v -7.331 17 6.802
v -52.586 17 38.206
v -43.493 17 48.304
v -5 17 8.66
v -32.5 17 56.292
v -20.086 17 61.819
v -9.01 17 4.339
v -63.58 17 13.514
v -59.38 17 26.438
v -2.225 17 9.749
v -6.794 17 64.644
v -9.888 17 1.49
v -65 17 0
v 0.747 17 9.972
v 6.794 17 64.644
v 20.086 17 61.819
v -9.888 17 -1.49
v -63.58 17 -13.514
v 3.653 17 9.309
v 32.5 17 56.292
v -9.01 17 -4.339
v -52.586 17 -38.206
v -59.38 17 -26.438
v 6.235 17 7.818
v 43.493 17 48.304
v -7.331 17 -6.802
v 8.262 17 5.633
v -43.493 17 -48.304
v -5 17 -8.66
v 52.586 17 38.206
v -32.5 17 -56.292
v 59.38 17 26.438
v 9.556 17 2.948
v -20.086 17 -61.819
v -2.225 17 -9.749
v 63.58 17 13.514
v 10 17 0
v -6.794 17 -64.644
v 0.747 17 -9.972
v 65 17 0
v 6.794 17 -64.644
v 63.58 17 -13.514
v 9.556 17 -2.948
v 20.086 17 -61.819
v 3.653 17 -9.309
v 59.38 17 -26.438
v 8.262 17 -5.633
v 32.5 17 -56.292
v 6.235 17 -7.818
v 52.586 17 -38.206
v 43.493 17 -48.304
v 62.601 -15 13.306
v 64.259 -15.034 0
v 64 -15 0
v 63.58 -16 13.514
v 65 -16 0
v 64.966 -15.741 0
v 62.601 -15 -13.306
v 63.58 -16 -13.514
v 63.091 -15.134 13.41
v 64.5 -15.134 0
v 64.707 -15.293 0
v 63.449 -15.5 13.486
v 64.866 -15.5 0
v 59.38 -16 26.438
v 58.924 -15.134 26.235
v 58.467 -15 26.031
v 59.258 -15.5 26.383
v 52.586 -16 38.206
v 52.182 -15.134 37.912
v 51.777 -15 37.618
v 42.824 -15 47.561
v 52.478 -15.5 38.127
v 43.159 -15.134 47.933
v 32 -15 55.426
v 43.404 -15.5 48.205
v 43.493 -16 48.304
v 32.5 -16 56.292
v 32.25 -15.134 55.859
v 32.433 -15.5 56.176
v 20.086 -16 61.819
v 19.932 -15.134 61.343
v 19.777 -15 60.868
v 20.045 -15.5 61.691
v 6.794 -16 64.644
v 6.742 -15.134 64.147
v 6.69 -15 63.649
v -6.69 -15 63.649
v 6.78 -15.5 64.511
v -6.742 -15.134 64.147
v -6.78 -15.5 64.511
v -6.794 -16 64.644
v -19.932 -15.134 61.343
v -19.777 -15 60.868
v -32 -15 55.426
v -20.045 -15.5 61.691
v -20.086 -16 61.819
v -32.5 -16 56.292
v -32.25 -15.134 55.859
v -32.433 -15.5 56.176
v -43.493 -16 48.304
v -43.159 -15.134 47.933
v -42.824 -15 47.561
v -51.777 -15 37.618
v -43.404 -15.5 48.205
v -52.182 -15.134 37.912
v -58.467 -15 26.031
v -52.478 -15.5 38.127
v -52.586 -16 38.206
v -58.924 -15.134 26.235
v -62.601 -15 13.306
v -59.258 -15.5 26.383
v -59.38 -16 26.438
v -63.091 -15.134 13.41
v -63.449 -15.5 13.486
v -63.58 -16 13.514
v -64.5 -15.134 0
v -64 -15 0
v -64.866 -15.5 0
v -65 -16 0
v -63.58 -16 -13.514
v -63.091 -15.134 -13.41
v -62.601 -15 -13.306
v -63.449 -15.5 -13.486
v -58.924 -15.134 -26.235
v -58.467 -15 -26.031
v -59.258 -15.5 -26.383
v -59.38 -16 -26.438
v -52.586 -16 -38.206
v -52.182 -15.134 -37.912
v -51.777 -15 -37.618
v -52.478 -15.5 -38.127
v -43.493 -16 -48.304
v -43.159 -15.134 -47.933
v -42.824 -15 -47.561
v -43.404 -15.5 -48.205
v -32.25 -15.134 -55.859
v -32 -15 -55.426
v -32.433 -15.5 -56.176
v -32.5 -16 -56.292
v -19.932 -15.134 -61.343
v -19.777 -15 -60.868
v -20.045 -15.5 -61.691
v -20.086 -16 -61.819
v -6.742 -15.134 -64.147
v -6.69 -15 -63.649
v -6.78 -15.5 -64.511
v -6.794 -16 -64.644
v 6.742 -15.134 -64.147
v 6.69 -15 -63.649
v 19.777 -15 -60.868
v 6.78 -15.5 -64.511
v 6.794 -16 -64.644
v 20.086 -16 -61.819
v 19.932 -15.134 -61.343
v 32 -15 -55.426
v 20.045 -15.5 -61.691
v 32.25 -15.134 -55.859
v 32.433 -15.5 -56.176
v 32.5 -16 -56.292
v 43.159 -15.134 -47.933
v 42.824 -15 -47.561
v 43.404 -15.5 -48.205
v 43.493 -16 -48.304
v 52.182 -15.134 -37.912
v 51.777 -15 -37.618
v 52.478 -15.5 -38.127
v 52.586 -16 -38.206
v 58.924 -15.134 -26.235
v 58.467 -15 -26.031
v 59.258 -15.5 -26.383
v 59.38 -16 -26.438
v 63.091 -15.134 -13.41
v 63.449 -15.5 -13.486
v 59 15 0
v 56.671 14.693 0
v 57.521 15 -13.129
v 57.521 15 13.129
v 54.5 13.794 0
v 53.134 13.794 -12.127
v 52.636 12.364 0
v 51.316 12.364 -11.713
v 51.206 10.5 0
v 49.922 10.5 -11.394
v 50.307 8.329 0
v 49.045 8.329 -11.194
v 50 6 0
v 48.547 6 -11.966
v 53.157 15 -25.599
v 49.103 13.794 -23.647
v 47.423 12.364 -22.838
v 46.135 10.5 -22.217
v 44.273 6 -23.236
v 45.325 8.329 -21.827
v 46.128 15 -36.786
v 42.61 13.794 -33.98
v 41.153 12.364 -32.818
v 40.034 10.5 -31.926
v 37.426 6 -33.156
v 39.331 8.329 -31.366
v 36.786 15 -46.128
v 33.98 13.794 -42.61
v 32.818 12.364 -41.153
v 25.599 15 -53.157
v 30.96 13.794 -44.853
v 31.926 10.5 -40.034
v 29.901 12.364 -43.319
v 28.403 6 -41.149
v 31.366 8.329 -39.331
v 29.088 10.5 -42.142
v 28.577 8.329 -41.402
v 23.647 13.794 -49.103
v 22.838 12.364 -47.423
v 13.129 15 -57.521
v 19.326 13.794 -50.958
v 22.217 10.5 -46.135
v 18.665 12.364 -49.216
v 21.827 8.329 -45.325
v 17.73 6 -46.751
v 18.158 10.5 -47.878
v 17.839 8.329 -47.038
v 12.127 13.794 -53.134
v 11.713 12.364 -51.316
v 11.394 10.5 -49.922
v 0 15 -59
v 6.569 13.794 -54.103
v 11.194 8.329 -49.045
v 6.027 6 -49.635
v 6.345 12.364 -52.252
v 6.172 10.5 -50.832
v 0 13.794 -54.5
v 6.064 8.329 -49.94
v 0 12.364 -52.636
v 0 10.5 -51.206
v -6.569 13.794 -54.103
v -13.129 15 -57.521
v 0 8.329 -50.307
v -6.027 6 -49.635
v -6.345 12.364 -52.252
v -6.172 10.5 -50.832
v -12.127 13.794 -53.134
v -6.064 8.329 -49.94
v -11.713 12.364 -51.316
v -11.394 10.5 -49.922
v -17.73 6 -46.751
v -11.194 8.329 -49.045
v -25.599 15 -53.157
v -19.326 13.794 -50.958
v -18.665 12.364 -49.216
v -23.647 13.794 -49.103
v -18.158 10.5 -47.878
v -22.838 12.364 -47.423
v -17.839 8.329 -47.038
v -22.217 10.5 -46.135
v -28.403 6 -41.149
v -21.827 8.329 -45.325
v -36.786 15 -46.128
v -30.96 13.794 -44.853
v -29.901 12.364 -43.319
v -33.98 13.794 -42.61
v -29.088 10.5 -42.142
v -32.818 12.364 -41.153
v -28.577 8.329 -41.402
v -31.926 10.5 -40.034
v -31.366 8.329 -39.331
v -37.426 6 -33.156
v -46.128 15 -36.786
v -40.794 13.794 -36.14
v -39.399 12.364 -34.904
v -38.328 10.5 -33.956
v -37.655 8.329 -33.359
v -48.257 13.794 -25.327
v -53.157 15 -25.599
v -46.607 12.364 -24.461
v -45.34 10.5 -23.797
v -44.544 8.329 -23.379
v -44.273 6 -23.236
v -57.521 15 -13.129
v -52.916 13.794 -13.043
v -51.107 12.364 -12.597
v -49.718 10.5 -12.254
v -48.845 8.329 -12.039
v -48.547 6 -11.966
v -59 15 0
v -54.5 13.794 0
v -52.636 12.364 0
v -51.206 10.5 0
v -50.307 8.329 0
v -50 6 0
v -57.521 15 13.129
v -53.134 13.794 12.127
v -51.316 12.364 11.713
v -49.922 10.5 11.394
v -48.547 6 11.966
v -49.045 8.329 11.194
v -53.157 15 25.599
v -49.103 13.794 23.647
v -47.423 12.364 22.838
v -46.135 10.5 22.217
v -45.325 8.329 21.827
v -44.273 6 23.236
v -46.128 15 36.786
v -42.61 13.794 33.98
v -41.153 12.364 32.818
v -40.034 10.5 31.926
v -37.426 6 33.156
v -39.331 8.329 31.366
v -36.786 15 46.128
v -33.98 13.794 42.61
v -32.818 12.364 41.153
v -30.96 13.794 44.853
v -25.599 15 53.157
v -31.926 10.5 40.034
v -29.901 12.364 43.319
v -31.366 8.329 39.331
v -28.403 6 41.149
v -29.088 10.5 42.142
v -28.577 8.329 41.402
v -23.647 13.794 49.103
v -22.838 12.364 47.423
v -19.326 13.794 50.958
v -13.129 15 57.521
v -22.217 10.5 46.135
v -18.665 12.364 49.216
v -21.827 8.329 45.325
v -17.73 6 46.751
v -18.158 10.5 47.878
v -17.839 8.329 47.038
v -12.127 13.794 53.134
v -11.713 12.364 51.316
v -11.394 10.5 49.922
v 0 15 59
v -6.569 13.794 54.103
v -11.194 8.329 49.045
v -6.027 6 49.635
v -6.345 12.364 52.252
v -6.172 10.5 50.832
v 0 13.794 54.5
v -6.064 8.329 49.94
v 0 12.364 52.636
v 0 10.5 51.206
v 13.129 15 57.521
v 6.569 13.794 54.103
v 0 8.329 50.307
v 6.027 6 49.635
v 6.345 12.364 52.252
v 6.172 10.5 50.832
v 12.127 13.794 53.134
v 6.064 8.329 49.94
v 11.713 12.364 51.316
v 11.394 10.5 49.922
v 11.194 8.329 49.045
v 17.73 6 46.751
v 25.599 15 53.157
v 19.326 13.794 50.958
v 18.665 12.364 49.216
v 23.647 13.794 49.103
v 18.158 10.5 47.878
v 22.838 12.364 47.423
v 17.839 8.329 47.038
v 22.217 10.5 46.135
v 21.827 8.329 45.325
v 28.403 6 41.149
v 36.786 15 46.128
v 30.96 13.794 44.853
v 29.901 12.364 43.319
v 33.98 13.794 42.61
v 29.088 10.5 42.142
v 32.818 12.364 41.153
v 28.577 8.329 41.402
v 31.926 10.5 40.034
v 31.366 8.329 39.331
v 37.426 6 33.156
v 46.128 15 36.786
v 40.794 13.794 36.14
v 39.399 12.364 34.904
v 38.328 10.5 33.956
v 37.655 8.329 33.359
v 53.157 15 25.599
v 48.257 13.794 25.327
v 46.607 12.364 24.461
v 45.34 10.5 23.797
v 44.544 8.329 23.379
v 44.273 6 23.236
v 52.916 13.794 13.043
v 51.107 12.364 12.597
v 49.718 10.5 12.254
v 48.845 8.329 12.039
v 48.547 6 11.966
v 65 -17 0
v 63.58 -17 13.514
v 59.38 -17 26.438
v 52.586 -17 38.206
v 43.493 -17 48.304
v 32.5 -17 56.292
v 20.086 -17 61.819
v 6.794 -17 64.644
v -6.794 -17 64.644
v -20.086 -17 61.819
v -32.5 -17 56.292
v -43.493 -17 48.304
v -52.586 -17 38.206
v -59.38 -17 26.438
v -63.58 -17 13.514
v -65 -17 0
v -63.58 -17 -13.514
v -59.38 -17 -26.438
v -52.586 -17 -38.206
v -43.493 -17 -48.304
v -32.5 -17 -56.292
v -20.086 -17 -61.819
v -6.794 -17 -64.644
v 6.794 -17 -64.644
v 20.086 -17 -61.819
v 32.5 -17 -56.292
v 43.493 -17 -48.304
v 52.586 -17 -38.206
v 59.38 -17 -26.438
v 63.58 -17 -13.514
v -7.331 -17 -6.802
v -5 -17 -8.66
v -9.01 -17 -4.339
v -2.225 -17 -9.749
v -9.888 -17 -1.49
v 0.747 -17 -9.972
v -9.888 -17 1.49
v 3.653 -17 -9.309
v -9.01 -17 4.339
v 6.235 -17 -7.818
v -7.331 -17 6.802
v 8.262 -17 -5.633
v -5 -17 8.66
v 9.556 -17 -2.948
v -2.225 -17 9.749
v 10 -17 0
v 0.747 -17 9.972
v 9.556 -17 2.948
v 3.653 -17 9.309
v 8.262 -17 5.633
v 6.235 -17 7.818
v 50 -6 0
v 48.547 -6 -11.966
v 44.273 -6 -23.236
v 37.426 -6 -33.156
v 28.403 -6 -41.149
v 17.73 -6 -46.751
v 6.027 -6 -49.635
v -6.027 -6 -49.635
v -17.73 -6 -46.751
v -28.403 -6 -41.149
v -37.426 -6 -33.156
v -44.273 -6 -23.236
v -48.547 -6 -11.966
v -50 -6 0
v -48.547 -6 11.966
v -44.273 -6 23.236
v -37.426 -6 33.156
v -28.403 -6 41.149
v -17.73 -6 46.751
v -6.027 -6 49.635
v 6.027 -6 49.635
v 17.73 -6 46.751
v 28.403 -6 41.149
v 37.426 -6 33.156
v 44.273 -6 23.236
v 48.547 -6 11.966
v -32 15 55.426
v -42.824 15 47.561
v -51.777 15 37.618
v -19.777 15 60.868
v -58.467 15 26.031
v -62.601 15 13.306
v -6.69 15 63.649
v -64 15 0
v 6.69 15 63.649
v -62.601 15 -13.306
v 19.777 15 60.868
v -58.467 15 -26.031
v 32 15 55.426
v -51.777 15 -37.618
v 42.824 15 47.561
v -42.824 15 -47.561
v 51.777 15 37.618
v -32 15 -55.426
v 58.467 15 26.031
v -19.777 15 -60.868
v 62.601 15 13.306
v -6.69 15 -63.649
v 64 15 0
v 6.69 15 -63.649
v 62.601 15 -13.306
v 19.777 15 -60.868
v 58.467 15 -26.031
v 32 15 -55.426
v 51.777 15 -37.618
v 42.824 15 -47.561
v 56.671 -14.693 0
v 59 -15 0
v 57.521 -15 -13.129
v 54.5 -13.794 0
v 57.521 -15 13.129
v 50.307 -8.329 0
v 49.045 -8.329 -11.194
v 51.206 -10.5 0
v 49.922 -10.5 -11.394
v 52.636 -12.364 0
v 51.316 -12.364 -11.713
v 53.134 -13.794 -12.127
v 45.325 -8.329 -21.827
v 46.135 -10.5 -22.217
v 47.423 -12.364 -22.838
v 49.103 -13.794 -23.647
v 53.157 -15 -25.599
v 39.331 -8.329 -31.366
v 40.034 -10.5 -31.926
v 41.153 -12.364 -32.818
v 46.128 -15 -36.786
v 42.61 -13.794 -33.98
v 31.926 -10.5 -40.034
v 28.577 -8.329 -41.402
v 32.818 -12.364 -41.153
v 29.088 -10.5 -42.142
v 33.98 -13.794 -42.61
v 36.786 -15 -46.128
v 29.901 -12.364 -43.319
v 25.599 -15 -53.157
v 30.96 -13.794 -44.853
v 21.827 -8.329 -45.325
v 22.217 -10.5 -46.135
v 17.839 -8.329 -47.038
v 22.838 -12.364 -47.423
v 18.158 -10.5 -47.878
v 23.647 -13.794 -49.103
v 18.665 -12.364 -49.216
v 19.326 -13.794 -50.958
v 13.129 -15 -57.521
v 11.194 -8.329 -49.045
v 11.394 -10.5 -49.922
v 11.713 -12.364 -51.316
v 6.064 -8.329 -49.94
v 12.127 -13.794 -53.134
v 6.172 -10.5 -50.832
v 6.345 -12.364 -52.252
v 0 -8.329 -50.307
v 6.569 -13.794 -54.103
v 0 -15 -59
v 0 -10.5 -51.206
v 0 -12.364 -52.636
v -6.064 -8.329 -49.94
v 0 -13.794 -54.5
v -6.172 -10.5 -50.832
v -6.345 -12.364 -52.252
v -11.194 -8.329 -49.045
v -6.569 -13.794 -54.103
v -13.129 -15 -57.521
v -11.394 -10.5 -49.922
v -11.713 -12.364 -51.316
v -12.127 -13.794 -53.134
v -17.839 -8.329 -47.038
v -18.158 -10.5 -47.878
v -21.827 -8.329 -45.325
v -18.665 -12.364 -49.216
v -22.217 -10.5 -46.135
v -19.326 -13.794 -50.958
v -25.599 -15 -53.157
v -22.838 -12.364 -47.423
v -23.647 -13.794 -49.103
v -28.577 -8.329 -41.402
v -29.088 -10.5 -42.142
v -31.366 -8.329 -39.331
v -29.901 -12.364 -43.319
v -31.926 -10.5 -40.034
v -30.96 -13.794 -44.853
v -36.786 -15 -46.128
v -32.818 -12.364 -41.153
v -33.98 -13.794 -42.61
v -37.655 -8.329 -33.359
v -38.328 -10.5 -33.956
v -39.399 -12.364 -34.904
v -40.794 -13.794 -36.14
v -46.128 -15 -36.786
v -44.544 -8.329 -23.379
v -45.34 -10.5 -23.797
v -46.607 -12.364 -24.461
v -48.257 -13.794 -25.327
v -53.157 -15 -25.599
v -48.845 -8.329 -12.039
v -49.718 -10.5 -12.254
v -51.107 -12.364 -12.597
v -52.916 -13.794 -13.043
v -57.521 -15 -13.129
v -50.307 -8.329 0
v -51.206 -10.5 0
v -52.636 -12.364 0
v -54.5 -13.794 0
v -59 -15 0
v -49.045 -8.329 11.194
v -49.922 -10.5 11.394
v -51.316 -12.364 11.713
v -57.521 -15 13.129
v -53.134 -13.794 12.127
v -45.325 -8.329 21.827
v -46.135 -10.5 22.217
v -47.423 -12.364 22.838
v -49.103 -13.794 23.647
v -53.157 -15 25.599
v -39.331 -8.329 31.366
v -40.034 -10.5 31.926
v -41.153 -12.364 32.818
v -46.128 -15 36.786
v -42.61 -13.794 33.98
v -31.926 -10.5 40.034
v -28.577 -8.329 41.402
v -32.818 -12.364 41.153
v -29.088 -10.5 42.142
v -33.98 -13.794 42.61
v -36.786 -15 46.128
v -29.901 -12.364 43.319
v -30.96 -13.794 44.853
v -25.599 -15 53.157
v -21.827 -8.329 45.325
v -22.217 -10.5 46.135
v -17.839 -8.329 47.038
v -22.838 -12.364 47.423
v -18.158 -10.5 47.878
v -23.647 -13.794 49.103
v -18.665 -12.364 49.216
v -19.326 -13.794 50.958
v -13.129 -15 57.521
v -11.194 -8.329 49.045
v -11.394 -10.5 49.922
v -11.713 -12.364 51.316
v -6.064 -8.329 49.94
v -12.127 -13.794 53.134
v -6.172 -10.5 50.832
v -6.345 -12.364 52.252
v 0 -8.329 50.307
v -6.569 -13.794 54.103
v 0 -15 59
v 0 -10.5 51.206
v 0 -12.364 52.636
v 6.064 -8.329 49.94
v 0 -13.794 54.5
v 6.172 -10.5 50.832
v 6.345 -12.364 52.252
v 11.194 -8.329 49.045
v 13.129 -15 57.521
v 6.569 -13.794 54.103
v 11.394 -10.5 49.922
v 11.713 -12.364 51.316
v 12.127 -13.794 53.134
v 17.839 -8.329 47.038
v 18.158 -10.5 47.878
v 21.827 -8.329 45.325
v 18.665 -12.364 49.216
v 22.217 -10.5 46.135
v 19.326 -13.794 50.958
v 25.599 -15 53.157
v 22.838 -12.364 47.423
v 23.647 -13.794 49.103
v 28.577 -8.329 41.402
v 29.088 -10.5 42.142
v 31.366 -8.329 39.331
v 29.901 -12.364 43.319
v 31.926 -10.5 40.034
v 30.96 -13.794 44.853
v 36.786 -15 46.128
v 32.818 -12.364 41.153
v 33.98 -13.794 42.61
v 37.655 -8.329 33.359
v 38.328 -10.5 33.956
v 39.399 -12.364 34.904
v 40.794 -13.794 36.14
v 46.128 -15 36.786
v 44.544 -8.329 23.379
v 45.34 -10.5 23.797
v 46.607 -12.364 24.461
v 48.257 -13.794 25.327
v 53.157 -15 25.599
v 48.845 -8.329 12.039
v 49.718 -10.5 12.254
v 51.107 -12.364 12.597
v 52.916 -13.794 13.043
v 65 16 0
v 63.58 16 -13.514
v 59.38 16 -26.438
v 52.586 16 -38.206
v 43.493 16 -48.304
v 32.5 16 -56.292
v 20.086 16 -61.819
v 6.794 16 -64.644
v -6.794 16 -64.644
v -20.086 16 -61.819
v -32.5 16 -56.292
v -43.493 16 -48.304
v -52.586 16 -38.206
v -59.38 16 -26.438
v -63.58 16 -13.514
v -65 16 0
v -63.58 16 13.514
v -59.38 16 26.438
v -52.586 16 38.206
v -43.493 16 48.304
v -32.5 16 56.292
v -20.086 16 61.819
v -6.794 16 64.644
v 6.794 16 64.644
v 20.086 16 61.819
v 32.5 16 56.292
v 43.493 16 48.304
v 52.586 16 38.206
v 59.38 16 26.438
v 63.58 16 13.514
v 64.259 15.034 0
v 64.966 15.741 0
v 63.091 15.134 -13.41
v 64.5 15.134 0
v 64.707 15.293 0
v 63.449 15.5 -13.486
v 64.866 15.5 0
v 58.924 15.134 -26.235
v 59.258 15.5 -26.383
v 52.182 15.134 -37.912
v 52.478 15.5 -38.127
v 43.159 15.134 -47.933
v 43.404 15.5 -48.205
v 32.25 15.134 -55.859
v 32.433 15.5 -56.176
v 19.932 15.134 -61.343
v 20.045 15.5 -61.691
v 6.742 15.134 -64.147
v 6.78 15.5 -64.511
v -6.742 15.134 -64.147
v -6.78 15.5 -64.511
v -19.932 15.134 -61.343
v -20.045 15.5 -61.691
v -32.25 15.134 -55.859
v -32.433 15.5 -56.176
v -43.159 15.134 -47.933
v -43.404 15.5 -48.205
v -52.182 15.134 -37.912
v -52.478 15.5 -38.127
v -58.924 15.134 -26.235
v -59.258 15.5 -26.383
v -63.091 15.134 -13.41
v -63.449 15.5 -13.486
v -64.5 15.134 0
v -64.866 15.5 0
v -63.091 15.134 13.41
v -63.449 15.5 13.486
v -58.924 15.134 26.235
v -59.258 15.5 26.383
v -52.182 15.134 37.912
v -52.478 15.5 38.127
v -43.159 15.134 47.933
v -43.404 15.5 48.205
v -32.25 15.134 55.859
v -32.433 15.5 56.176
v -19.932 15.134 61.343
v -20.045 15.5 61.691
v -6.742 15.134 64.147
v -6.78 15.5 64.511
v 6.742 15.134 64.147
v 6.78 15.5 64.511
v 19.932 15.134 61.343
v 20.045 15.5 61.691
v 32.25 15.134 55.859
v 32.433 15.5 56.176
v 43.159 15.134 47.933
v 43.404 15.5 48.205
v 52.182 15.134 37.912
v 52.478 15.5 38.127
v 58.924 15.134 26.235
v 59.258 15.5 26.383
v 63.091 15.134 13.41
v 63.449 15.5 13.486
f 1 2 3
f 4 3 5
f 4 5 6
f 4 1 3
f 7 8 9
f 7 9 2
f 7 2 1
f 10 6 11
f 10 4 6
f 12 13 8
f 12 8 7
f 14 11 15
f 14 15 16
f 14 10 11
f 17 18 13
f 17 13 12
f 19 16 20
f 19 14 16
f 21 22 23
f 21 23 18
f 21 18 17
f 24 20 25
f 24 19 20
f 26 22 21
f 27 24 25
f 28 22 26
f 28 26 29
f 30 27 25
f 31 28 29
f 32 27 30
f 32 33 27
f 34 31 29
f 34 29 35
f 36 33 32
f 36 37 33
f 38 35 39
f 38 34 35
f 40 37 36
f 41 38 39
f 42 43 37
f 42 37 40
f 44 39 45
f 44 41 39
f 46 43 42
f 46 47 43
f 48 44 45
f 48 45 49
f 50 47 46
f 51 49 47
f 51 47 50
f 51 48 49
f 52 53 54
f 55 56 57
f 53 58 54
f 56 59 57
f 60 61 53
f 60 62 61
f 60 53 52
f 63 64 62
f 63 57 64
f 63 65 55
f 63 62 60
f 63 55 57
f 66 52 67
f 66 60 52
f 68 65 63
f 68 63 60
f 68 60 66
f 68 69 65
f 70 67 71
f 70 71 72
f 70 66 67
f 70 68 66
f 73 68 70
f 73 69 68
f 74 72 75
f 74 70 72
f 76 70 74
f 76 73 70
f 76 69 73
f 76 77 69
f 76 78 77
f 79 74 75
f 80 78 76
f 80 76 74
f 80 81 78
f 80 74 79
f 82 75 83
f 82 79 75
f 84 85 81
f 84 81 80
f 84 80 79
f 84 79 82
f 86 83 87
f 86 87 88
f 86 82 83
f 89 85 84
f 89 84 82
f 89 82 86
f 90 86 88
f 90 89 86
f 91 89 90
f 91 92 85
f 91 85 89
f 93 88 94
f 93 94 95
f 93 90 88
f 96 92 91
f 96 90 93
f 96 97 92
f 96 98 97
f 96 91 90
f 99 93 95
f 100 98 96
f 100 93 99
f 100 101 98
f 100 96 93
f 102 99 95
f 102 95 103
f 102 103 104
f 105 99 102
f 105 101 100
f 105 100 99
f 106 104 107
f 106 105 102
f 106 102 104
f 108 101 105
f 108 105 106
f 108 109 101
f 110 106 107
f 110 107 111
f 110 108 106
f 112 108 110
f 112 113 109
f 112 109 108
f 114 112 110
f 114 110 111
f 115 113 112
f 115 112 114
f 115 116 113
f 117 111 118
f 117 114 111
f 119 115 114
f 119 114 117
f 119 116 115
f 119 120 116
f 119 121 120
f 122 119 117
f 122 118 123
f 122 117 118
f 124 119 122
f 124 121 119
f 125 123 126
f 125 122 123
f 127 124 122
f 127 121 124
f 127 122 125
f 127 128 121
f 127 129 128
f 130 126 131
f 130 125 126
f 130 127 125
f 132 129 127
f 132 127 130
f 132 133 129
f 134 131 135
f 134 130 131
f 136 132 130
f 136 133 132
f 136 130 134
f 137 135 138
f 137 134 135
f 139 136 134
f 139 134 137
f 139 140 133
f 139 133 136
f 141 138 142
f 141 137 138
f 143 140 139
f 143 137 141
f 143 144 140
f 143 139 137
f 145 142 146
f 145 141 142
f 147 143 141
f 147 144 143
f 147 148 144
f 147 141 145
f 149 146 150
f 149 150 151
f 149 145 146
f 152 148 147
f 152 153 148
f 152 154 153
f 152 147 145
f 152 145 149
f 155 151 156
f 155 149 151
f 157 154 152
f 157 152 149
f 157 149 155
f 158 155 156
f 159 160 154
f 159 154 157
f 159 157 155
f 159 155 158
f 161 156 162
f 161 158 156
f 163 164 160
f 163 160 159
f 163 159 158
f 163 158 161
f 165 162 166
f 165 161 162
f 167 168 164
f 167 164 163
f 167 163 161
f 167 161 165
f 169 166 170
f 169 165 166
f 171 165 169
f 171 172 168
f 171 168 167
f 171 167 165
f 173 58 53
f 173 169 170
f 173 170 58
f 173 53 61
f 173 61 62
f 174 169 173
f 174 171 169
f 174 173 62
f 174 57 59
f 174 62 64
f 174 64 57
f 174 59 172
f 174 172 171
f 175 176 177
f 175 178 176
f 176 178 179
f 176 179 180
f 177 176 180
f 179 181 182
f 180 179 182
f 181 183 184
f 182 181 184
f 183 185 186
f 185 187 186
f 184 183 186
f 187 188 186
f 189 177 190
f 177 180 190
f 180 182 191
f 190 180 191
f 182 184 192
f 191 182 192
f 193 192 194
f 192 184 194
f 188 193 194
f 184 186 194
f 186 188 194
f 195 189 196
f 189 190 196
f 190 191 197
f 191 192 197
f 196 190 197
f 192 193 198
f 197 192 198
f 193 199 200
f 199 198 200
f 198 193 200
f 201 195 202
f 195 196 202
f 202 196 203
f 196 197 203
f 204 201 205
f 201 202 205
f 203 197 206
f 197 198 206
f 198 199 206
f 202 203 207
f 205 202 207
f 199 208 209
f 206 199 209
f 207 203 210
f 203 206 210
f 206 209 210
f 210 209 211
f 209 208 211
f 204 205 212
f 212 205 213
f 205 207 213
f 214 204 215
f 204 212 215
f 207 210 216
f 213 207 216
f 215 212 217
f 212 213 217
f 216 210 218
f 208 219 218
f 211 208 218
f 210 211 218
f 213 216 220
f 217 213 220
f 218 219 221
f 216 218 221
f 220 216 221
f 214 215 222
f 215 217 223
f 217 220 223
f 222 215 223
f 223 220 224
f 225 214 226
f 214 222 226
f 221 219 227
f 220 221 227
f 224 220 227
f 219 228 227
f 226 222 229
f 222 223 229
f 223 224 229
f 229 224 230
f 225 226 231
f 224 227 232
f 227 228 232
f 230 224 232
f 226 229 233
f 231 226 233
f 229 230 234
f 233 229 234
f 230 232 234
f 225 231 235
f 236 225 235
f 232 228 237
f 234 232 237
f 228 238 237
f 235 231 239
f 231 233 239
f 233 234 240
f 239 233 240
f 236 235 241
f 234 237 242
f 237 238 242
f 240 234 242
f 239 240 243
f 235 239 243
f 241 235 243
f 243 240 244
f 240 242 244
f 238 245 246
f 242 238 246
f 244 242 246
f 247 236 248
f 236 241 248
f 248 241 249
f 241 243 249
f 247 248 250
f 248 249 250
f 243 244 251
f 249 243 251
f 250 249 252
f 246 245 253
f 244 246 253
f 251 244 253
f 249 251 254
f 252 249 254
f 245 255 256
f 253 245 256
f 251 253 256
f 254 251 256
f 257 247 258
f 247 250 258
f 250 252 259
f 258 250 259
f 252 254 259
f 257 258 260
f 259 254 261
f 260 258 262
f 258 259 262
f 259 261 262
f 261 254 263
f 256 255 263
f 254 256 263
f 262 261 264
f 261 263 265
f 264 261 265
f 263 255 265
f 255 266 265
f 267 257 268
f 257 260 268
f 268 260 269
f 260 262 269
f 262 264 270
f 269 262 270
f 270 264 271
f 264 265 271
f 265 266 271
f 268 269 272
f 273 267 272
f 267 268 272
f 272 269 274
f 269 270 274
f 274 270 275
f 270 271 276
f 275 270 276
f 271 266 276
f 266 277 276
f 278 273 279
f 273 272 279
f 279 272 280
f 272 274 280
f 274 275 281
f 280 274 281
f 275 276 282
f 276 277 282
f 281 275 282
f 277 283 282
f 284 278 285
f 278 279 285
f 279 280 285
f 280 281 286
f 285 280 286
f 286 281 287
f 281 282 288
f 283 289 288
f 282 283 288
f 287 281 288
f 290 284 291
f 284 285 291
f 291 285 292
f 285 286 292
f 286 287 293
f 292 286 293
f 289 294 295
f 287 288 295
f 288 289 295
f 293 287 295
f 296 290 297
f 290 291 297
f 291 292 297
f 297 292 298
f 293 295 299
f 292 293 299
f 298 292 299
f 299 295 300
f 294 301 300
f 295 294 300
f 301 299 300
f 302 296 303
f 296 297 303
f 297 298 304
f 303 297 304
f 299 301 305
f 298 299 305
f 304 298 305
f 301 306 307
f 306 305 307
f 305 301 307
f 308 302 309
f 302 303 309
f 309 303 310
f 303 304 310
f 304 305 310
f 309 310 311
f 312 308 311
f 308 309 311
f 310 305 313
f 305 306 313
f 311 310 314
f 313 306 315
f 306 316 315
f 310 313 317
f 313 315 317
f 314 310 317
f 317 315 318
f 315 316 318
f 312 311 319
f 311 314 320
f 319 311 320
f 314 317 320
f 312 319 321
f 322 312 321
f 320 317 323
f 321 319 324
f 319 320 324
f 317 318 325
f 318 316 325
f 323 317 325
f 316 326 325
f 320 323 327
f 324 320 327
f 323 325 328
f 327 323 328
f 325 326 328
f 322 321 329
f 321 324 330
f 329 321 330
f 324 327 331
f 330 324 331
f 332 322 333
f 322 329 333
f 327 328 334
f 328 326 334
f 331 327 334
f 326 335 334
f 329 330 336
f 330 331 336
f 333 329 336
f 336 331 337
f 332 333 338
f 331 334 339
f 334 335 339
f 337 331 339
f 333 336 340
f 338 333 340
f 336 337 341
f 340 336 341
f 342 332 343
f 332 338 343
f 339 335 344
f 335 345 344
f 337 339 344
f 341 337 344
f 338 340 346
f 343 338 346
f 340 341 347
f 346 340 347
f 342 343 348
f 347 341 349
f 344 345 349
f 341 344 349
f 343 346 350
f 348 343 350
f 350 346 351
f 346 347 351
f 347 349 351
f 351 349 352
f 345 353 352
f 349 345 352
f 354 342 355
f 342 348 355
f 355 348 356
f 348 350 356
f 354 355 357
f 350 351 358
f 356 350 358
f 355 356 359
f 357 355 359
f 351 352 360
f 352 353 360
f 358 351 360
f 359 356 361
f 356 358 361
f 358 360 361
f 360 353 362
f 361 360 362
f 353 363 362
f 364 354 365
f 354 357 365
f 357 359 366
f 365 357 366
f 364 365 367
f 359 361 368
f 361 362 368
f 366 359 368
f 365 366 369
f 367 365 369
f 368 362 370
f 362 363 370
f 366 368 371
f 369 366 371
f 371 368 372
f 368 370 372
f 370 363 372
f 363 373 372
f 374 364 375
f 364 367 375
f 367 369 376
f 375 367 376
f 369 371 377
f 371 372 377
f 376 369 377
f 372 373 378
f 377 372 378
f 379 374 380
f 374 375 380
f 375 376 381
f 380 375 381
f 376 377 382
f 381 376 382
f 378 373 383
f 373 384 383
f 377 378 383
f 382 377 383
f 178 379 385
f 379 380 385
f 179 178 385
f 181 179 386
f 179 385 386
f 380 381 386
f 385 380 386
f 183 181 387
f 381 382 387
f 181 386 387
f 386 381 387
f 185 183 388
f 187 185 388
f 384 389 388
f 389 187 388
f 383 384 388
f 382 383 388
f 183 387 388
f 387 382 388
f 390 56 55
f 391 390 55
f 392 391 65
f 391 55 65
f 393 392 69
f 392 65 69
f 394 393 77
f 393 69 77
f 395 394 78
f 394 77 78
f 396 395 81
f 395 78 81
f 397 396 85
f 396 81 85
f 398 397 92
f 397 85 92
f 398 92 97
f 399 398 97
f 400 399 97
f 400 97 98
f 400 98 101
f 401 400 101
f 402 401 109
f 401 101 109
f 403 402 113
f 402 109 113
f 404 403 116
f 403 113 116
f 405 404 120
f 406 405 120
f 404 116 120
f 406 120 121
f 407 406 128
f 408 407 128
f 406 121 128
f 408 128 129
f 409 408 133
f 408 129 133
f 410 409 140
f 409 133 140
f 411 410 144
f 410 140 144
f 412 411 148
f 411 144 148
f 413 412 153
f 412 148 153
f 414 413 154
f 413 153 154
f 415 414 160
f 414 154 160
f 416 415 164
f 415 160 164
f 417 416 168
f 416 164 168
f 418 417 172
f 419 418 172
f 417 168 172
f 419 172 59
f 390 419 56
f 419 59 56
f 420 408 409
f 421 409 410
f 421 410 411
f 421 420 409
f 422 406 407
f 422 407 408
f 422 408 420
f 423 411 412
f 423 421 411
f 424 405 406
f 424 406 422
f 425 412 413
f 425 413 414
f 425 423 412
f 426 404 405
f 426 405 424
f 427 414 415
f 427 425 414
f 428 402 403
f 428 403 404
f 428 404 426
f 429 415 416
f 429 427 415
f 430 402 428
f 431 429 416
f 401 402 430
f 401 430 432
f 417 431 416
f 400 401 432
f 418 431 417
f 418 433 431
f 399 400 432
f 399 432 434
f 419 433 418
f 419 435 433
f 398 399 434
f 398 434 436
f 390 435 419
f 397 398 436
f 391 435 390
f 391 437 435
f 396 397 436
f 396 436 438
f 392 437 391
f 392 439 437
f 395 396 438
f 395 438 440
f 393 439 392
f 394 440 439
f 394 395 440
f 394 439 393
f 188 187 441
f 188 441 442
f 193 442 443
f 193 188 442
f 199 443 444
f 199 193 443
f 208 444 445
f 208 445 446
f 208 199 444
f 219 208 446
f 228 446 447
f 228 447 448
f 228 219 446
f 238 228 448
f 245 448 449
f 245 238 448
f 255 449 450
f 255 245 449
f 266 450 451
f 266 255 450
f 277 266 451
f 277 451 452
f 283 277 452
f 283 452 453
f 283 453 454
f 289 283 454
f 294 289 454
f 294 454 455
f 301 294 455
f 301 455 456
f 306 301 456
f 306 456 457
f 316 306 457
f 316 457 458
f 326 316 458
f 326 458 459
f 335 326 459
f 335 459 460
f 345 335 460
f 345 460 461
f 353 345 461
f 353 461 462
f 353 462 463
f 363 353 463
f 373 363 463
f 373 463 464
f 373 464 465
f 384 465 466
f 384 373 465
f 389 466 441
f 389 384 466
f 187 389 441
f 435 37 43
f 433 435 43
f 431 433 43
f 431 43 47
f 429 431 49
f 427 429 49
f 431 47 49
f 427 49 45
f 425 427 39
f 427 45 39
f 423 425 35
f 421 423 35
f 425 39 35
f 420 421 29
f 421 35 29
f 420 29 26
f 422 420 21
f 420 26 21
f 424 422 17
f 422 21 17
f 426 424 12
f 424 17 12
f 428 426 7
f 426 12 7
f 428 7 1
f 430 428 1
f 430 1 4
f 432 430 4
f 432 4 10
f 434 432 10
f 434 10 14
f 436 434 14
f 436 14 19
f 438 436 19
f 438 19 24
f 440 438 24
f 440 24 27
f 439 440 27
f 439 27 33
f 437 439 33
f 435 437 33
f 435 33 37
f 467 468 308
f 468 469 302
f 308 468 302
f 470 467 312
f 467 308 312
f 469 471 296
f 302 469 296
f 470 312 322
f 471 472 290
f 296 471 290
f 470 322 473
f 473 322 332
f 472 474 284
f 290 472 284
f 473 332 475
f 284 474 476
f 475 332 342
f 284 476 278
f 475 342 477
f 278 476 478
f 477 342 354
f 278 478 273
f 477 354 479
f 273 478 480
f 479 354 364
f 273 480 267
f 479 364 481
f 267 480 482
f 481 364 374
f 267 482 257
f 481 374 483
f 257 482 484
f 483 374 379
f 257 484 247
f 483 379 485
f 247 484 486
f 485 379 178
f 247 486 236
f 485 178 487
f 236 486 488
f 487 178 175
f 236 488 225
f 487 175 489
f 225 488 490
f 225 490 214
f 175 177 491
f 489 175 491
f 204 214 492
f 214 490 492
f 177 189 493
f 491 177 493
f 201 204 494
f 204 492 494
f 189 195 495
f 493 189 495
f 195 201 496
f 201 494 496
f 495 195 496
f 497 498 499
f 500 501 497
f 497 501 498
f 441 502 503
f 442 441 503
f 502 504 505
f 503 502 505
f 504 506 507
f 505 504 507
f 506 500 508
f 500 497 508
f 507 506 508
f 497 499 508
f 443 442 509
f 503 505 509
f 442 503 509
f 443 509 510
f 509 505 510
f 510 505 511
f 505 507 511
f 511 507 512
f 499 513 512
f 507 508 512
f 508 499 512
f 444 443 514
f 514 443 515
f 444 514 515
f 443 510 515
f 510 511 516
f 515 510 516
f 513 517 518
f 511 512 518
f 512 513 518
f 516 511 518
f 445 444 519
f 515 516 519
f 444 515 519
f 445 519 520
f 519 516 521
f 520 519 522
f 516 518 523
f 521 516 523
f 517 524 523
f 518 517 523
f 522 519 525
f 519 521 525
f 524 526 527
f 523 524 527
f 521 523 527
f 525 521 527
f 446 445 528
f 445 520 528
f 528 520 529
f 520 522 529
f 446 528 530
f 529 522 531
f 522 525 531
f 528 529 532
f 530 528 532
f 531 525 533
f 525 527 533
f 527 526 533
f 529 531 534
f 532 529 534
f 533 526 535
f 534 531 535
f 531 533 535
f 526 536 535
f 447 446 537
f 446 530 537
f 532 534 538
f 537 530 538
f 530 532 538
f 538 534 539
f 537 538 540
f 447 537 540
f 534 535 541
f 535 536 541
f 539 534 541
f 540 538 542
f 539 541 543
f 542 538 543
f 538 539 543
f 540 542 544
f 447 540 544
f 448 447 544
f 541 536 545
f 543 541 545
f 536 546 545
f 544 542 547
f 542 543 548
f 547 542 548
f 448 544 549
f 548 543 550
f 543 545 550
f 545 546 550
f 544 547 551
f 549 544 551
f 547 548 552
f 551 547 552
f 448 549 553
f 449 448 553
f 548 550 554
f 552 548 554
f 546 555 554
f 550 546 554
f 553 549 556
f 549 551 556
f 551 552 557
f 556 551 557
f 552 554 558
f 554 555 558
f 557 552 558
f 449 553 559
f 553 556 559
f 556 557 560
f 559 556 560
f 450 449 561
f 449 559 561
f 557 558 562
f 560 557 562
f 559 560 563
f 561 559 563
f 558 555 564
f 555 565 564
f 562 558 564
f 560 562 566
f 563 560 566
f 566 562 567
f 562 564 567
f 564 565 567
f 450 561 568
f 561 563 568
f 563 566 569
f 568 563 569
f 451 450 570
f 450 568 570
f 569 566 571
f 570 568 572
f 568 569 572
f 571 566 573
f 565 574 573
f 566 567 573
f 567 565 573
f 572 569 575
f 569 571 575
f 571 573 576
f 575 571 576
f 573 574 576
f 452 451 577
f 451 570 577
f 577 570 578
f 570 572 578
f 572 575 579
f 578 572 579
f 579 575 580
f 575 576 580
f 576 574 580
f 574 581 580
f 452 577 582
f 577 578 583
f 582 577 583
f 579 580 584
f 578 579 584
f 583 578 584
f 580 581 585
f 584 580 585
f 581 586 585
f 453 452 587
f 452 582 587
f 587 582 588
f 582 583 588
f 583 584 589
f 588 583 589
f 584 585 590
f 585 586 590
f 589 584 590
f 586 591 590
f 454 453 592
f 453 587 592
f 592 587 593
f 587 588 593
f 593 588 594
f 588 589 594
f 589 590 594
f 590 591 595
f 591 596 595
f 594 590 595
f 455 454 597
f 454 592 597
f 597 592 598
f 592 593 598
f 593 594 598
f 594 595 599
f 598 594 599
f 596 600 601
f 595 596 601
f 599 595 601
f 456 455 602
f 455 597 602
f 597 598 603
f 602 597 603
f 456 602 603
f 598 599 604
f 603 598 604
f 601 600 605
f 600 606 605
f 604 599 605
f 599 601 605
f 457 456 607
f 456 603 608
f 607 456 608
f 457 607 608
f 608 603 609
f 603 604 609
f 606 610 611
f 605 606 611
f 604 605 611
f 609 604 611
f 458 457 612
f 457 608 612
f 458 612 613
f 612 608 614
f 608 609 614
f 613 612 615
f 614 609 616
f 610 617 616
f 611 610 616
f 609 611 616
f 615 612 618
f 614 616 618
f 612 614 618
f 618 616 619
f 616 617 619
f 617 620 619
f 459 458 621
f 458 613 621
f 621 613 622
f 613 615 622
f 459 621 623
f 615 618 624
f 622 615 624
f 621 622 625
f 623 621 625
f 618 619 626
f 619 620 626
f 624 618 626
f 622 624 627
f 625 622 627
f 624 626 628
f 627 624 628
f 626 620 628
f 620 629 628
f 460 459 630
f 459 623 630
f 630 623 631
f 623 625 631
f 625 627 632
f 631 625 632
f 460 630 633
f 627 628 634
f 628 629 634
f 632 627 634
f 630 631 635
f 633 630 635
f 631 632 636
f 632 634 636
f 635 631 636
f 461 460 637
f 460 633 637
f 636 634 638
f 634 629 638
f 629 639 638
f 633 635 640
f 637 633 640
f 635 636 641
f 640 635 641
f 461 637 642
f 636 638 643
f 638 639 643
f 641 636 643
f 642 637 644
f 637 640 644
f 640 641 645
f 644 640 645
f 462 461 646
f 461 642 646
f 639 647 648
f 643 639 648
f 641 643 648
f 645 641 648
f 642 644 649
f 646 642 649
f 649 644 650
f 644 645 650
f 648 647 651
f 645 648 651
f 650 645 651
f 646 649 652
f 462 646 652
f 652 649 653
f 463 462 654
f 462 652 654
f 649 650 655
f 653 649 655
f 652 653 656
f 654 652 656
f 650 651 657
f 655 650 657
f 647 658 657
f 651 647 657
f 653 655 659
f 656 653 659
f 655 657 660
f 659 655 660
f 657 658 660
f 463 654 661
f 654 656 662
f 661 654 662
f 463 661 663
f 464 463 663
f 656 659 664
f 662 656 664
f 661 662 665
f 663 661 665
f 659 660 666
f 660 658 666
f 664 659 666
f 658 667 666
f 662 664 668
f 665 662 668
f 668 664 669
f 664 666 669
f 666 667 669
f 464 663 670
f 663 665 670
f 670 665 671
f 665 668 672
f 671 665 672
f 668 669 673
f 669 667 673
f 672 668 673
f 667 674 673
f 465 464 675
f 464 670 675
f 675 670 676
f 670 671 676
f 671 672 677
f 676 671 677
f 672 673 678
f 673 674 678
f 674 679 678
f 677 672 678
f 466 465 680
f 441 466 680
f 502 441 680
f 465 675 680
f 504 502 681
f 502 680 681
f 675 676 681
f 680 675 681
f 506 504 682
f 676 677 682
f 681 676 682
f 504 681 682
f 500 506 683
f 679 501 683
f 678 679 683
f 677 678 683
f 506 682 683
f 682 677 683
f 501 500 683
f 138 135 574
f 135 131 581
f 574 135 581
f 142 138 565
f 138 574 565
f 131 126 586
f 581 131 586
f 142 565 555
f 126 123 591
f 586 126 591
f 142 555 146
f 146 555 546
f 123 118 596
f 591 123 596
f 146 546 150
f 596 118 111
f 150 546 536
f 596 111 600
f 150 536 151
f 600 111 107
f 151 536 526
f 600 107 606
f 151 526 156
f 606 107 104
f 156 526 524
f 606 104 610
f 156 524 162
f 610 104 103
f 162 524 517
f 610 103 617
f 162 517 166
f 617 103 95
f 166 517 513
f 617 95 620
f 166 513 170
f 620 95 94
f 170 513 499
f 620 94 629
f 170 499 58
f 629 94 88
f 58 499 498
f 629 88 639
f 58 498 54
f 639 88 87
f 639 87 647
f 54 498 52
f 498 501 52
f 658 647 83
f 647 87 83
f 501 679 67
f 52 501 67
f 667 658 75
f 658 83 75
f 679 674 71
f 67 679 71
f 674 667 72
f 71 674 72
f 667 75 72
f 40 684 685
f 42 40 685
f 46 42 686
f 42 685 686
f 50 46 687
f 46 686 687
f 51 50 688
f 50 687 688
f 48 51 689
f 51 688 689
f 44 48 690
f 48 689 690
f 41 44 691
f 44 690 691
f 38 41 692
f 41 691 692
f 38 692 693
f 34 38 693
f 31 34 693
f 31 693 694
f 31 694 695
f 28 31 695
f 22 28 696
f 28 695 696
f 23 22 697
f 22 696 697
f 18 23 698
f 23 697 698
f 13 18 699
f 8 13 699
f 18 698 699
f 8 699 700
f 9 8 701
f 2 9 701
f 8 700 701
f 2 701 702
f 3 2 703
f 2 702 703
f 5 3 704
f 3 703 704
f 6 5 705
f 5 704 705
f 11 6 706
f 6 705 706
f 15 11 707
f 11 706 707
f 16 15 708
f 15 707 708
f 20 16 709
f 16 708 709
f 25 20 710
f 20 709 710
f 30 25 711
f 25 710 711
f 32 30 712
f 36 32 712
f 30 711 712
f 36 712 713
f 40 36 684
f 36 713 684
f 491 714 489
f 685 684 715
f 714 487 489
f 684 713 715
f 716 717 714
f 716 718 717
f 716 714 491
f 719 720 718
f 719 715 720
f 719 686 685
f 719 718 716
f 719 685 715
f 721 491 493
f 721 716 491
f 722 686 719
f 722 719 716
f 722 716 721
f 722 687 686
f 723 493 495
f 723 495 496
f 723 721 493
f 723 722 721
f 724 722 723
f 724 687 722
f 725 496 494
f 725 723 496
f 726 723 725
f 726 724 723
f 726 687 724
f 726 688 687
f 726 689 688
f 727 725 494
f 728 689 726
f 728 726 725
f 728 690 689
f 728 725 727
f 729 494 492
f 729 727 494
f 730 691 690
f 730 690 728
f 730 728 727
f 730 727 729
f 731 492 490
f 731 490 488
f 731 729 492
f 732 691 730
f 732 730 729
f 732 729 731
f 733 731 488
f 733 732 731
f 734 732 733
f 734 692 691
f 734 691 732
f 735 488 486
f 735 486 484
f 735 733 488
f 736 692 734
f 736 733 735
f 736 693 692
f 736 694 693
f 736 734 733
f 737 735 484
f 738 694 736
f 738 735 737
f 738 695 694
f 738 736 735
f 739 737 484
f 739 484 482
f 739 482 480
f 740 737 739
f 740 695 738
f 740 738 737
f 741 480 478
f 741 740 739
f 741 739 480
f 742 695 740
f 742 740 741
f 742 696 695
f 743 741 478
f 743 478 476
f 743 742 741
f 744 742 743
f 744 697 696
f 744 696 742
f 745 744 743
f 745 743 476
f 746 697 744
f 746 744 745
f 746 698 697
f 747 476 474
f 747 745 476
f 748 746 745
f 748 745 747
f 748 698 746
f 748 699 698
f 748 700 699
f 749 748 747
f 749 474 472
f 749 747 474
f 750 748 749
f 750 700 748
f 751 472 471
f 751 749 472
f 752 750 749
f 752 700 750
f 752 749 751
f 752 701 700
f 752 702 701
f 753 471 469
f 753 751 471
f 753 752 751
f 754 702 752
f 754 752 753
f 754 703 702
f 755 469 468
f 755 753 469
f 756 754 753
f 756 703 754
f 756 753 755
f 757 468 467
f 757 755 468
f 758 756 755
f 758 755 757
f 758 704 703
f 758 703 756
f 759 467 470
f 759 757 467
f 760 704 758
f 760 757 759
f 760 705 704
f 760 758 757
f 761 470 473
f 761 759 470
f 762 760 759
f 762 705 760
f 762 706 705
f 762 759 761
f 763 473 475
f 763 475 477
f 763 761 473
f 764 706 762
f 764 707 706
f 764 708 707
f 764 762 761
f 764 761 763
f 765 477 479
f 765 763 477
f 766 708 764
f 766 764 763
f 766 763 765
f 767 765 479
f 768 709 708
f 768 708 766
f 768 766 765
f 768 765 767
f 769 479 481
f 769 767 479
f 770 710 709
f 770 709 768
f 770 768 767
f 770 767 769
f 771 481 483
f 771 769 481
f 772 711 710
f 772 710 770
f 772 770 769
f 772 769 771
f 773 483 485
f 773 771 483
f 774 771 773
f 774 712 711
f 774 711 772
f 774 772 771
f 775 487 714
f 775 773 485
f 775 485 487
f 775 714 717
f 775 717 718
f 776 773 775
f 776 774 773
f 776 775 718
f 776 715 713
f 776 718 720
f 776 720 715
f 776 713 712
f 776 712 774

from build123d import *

# Parameters (mm, degrees)
BOSS_EXTRUDE1_DEPTH      = 15
BOSS_EXTRUDE1_DEPTH_BACK = 15
SKETCH1_R                = 50
SKETCH2_R                = 65
BOSS_EXTRUDE2_DEPTH      = 2
BOSS_EXTRUDE3_START      = 2
SKETCH3_R                = 65
BOSS_EXTRUDE3_DEPTH      = 2
FILLET1_R                = 9
FILLET2_R                = 1
FILLET3_R                = 1
FILLET4_R                = 9
CUT_EXTRUDE1_REACH       = 100.01
SKETCH4_R                = 10


with BuildPart() as part:
    # Sketch1 → Boss-Extrude1 (new, two sides: drawn at the far end of the back side and taken through both)
    with BuildSketch(Plane(origin=(0, 0, 0), x_dir=(1, 0, 0), z_dir=(0, 1, 0)).offset(-BOSS_EXTRUDE1_DEPTH_BACK)):
        Circle(SKETCH1_R)
    extrude(amount=BOSS_EXTRUDE1_DEPTH + BOSS_EXTRUDE1_DEPTH_BACK)

    # Sketch2 → Boss-Extrude2 (add)
    with BuildSketch(Plane.XZ.offset(15)):
        Circle(SKETCH2_R)
    extrude(amount=BOSS_EXTRUDE2_DEPTH)

    # Sketch3 → Boss-Extrude3 (add)
    with BuildSketch(Plane(origin=(0, 15, 0), x_dir=(1, 0, 0), z_dir=(0, 1, 0)).offset(BOSS_EXTRUDE3_START)):
        Circle(SKETCH3_R)
    extrude(amount=-BOSS_EXTRUDE3_DEPTH)

    # Fillet1
    fillet1_edges = [part.edges().sort_by_distance(p)[0] for p in [
        (-50, -15, 0),
    ]]
    fillet(fillet1_edges, radius=FILLET1_R)

    # Fillet2
    fillet2_edges = [part.edges().sort_by_distance(p)[0] for p in [
        (-65, -15, 0),
    ]]
    fillet(fillet2_edges, radius=FILLET2_R)

    # Fillet3
    fillet3_edges = [part.edges().sort_by_distance(p)[0] for p in [
        (-65, 15, 0),
    ]]
    fillet(fillet3_edges, radius=FILLET3_R)

    # Fillet4
    fillet4_edges = [part.edges().sort_by_distance(p)[0] for p in [
        (-50, 15, 0),
    ]]
    fillet(fillet4_edges, radius=FILLET4_R)

    # Sketch4 → Cut-Extrude1 (cut, up to next)
    with BuildSketch(Plane(origin=(0, 17, 0), x_dir=(1, 0, 0), z_dir=(0, 1, 0)), mode=Mode.PRIVATE) as cut_extrude1_sk1:
        Circle(SKETCH4_R)
    cut_extrude1_tool1 = extrude(cut_extrude1_sk1.sketch, amount=-CUT_EXTRUDE1_REACH, mode=Mode.PRIVATE) & part.part
    add(cut_extrude1_tool1.solids().sort_by_distance((0, 17, 0))[0], mode=Mode.SUBTRACT)


solid = part.part
